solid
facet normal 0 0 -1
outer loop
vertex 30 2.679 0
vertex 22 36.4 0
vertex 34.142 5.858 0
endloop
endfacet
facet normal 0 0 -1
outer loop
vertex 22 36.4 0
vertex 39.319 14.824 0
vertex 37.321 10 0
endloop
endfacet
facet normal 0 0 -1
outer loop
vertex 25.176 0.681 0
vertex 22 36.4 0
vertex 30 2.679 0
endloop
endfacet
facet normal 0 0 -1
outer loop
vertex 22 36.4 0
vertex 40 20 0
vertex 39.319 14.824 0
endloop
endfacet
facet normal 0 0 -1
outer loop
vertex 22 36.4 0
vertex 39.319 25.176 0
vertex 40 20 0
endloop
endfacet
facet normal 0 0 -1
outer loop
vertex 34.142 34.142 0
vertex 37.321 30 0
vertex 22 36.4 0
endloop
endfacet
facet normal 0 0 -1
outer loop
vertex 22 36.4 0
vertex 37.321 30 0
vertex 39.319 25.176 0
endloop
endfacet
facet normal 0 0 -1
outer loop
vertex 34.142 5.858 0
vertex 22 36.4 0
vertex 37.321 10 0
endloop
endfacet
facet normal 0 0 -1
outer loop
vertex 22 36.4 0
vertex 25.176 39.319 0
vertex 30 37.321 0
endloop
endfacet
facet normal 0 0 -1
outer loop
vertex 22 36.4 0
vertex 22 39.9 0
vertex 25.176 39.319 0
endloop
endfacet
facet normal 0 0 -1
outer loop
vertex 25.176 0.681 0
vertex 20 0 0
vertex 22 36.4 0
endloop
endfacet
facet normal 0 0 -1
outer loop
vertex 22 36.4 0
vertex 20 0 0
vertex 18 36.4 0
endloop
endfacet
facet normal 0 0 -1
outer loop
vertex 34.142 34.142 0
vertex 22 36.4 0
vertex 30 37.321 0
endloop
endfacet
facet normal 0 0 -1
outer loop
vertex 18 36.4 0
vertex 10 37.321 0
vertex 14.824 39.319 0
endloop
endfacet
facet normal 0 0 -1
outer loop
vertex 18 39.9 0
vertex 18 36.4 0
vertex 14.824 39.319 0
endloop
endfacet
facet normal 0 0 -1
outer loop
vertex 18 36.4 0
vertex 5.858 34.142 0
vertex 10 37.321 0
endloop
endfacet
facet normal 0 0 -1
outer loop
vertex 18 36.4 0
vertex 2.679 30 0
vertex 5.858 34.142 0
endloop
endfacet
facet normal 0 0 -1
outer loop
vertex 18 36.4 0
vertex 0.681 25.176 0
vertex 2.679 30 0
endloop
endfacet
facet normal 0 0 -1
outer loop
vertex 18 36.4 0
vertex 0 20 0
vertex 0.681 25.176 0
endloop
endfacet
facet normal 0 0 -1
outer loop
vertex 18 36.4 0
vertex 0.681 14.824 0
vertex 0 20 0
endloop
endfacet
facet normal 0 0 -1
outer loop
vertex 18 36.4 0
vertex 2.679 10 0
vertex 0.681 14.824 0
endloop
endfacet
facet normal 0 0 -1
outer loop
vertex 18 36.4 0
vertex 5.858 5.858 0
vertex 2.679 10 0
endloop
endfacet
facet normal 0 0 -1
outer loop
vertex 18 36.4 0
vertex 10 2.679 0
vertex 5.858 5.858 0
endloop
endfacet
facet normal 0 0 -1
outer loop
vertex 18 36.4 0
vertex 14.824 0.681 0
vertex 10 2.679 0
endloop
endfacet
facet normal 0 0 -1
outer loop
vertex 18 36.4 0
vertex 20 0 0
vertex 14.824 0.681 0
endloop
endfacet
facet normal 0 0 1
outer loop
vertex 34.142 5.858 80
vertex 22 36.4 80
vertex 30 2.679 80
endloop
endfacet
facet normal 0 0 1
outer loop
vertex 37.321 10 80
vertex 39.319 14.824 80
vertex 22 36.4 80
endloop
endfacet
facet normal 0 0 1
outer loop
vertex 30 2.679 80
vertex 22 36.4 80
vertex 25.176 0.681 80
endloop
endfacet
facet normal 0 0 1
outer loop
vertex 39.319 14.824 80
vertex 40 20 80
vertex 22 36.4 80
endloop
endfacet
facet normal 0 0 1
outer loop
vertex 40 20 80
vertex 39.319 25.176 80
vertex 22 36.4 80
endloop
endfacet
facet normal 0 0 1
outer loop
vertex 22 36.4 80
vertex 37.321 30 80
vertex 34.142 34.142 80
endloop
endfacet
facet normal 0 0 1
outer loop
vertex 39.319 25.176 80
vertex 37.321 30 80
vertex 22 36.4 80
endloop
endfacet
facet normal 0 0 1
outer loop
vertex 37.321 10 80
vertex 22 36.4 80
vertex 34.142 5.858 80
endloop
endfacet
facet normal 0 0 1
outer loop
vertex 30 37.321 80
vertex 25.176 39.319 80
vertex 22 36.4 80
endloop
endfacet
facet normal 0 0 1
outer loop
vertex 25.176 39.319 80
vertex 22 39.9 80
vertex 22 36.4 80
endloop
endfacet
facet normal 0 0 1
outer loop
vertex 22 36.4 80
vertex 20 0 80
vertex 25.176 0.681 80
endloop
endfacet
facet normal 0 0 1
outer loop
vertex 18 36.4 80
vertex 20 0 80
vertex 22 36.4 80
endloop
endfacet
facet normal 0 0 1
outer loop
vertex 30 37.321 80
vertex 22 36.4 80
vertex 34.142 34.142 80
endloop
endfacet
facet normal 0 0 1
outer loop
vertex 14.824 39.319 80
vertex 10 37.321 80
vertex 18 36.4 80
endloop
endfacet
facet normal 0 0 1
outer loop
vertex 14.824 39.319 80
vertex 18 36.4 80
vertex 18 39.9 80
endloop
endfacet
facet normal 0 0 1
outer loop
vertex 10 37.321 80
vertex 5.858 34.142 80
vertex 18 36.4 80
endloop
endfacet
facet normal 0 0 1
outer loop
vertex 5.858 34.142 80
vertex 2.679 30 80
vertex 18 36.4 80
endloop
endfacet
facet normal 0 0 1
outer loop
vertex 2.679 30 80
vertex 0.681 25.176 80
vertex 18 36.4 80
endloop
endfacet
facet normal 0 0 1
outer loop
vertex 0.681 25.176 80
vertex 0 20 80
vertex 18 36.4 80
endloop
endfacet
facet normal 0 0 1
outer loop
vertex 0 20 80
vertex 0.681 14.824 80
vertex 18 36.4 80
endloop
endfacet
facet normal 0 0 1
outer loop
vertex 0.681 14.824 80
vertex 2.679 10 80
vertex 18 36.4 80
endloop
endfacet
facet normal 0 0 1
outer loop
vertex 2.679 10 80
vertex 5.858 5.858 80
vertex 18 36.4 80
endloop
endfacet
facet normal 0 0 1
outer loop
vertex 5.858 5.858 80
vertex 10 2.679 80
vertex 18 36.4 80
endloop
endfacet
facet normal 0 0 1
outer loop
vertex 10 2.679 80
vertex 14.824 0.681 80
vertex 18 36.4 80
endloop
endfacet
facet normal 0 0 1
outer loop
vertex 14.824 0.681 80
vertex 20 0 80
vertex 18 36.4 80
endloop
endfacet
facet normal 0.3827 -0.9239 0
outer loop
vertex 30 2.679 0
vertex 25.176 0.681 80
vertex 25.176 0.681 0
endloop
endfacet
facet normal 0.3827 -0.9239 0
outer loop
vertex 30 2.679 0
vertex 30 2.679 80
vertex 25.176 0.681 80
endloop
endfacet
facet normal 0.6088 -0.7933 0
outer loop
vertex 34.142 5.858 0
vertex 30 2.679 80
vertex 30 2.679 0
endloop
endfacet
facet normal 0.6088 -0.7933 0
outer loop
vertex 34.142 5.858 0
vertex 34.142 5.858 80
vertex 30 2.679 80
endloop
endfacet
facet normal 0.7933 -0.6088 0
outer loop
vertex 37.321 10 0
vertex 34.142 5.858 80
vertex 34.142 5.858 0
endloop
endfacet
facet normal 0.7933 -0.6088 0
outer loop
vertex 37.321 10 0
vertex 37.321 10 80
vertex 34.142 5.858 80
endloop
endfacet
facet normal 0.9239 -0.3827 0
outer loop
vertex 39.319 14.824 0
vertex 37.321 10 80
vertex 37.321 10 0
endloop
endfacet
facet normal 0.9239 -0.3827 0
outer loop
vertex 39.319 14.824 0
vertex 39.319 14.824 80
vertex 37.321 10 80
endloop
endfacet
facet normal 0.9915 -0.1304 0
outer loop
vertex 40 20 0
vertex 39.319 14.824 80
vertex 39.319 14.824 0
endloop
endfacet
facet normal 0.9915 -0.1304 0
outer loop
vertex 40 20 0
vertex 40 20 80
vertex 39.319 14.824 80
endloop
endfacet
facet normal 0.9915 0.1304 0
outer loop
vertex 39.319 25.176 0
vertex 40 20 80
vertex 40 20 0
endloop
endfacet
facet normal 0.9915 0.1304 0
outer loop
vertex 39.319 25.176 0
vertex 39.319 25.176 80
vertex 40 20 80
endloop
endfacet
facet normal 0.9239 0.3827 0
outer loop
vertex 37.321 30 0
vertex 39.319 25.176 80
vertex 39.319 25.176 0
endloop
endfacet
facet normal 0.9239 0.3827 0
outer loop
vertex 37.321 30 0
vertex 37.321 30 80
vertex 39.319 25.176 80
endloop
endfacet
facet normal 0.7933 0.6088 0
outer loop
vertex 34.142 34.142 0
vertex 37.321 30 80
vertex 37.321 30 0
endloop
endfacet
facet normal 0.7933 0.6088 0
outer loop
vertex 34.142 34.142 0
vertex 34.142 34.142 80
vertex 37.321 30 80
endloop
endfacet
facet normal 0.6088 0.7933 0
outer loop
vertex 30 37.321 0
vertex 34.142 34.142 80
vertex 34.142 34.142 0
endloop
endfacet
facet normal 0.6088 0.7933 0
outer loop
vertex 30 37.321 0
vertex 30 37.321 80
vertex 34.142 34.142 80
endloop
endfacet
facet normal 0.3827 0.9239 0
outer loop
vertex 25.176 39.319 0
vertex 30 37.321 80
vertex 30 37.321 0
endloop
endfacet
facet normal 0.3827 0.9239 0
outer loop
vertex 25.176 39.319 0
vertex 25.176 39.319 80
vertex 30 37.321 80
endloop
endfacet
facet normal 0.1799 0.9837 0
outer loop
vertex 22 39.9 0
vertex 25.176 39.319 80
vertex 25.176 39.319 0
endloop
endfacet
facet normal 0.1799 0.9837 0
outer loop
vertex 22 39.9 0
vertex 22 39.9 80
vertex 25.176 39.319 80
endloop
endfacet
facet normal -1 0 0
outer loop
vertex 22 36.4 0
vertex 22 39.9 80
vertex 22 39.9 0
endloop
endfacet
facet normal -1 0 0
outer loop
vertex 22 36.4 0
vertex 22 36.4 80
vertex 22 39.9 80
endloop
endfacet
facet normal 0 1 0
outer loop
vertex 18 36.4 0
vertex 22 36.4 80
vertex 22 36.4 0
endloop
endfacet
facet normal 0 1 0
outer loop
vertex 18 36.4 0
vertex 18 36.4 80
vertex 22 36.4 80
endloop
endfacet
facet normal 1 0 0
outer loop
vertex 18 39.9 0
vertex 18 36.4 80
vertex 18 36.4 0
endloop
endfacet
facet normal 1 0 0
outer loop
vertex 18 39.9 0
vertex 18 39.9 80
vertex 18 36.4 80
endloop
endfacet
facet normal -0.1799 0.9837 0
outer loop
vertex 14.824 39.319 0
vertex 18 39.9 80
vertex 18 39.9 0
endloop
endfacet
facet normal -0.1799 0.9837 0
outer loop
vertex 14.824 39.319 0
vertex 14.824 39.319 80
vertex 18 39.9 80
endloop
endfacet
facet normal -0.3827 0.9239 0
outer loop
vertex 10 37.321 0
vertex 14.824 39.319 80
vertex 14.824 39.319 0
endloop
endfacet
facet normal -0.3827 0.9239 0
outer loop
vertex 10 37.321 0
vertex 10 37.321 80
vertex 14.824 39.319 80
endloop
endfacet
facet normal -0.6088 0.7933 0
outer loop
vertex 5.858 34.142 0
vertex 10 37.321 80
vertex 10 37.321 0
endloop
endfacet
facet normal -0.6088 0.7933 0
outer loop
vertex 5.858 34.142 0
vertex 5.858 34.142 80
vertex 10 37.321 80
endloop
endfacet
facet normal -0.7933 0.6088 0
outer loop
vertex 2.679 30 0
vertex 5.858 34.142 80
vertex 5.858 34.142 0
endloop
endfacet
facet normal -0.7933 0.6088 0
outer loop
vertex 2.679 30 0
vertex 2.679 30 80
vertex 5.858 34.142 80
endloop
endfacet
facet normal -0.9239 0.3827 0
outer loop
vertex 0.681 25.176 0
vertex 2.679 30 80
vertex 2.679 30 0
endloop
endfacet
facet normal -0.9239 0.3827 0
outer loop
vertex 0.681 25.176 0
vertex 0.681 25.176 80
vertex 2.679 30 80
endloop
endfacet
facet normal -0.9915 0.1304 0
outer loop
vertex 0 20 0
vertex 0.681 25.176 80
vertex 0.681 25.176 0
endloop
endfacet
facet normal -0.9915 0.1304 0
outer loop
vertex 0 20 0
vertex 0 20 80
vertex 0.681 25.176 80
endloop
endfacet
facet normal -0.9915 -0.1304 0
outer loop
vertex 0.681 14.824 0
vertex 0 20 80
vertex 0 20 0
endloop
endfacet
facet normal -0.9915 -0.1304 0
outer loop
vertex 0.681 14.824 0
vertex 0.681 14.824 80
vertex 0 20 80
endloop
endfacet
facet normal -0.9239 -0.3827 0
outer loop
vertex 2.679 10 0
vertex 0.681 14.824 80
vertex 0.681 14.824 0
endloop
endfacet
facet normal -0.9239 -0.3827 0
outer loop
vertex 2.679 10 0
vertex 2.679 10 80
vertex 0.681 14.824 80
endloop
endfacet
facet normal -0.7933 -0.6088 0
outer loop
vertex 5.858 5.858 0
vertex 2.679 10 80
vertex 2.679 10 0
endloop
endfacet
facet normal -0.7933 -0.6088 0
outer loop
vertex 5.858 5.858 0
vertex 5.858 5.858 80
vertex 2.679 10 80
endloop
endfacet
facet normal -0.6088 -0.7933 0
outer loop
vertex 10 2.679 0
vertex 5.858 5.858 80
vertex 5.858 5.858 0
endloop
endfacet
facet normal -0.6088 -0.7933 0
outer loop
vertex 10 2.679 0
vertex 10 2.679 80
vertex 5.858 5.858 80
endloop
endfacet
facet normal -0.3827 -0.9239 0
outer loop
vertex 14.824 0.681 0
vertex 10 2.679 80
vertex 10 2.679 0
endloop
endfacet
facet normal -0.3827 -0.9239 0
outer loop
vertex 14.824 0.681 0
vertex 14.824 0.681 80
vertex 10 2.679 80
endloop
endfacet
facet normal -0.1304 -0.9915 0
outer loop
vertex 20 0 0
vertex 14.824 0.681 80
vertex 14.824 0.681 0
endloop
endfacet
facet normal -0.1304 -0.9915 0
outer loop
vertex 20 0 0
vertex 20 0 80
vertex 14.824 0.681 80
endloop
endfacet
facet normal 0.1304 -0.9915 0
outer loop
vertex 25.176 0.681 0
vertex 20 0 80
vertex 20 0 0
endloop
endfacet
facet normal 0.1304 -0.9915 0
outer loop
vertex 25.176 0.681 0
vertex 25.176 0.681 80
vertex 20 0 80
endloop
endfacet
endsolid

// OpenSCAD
$fn = 32;

// ----------------------------------------------------------------------
// Keyway shaft: d40 shaft, key 4 x 3.5 mm
// ----------------------------------------------------------------------

// --- parameters (mm) ---
shaft_r = 20;             // shaft radius
key_w = 4;                // keyway width
key_d = 3.5;              // keyway depth below the surface line
plate_t = 80;             // shaft length, Z (extrusion height)

shaft_d = 2 * shaft_r;  // shaft diameter
circle_step = 15;  // polygon sampling step, degrees

profile = [[14.824, 39.319], [10, 37.321], [5.858, 34.142], [2.679, 30], [0.681, 25.176], [0, 20], [0.681, 14.824], [2.679, 10], [5.858, 5.858], [10, 2.679], [14.824, 0.681], [20, 0], [25.176, 0.681], [30, 2.679], [34.142, 5.858], [37.321, 10], [39.319, 14.824], [40, 20], [39.319, 25.176], [37.321, 30], [34.142, 34.142], [30, 37.321], [25.176, 39.319], [22, 39.9], [22, 36.4], [18, 36.4], [18, 39.9]];  // primary outline, 27 points, counter clockwise

// --- the one profile operation ---
linear_extrude(height = plate_t) polygon(points = profile);
